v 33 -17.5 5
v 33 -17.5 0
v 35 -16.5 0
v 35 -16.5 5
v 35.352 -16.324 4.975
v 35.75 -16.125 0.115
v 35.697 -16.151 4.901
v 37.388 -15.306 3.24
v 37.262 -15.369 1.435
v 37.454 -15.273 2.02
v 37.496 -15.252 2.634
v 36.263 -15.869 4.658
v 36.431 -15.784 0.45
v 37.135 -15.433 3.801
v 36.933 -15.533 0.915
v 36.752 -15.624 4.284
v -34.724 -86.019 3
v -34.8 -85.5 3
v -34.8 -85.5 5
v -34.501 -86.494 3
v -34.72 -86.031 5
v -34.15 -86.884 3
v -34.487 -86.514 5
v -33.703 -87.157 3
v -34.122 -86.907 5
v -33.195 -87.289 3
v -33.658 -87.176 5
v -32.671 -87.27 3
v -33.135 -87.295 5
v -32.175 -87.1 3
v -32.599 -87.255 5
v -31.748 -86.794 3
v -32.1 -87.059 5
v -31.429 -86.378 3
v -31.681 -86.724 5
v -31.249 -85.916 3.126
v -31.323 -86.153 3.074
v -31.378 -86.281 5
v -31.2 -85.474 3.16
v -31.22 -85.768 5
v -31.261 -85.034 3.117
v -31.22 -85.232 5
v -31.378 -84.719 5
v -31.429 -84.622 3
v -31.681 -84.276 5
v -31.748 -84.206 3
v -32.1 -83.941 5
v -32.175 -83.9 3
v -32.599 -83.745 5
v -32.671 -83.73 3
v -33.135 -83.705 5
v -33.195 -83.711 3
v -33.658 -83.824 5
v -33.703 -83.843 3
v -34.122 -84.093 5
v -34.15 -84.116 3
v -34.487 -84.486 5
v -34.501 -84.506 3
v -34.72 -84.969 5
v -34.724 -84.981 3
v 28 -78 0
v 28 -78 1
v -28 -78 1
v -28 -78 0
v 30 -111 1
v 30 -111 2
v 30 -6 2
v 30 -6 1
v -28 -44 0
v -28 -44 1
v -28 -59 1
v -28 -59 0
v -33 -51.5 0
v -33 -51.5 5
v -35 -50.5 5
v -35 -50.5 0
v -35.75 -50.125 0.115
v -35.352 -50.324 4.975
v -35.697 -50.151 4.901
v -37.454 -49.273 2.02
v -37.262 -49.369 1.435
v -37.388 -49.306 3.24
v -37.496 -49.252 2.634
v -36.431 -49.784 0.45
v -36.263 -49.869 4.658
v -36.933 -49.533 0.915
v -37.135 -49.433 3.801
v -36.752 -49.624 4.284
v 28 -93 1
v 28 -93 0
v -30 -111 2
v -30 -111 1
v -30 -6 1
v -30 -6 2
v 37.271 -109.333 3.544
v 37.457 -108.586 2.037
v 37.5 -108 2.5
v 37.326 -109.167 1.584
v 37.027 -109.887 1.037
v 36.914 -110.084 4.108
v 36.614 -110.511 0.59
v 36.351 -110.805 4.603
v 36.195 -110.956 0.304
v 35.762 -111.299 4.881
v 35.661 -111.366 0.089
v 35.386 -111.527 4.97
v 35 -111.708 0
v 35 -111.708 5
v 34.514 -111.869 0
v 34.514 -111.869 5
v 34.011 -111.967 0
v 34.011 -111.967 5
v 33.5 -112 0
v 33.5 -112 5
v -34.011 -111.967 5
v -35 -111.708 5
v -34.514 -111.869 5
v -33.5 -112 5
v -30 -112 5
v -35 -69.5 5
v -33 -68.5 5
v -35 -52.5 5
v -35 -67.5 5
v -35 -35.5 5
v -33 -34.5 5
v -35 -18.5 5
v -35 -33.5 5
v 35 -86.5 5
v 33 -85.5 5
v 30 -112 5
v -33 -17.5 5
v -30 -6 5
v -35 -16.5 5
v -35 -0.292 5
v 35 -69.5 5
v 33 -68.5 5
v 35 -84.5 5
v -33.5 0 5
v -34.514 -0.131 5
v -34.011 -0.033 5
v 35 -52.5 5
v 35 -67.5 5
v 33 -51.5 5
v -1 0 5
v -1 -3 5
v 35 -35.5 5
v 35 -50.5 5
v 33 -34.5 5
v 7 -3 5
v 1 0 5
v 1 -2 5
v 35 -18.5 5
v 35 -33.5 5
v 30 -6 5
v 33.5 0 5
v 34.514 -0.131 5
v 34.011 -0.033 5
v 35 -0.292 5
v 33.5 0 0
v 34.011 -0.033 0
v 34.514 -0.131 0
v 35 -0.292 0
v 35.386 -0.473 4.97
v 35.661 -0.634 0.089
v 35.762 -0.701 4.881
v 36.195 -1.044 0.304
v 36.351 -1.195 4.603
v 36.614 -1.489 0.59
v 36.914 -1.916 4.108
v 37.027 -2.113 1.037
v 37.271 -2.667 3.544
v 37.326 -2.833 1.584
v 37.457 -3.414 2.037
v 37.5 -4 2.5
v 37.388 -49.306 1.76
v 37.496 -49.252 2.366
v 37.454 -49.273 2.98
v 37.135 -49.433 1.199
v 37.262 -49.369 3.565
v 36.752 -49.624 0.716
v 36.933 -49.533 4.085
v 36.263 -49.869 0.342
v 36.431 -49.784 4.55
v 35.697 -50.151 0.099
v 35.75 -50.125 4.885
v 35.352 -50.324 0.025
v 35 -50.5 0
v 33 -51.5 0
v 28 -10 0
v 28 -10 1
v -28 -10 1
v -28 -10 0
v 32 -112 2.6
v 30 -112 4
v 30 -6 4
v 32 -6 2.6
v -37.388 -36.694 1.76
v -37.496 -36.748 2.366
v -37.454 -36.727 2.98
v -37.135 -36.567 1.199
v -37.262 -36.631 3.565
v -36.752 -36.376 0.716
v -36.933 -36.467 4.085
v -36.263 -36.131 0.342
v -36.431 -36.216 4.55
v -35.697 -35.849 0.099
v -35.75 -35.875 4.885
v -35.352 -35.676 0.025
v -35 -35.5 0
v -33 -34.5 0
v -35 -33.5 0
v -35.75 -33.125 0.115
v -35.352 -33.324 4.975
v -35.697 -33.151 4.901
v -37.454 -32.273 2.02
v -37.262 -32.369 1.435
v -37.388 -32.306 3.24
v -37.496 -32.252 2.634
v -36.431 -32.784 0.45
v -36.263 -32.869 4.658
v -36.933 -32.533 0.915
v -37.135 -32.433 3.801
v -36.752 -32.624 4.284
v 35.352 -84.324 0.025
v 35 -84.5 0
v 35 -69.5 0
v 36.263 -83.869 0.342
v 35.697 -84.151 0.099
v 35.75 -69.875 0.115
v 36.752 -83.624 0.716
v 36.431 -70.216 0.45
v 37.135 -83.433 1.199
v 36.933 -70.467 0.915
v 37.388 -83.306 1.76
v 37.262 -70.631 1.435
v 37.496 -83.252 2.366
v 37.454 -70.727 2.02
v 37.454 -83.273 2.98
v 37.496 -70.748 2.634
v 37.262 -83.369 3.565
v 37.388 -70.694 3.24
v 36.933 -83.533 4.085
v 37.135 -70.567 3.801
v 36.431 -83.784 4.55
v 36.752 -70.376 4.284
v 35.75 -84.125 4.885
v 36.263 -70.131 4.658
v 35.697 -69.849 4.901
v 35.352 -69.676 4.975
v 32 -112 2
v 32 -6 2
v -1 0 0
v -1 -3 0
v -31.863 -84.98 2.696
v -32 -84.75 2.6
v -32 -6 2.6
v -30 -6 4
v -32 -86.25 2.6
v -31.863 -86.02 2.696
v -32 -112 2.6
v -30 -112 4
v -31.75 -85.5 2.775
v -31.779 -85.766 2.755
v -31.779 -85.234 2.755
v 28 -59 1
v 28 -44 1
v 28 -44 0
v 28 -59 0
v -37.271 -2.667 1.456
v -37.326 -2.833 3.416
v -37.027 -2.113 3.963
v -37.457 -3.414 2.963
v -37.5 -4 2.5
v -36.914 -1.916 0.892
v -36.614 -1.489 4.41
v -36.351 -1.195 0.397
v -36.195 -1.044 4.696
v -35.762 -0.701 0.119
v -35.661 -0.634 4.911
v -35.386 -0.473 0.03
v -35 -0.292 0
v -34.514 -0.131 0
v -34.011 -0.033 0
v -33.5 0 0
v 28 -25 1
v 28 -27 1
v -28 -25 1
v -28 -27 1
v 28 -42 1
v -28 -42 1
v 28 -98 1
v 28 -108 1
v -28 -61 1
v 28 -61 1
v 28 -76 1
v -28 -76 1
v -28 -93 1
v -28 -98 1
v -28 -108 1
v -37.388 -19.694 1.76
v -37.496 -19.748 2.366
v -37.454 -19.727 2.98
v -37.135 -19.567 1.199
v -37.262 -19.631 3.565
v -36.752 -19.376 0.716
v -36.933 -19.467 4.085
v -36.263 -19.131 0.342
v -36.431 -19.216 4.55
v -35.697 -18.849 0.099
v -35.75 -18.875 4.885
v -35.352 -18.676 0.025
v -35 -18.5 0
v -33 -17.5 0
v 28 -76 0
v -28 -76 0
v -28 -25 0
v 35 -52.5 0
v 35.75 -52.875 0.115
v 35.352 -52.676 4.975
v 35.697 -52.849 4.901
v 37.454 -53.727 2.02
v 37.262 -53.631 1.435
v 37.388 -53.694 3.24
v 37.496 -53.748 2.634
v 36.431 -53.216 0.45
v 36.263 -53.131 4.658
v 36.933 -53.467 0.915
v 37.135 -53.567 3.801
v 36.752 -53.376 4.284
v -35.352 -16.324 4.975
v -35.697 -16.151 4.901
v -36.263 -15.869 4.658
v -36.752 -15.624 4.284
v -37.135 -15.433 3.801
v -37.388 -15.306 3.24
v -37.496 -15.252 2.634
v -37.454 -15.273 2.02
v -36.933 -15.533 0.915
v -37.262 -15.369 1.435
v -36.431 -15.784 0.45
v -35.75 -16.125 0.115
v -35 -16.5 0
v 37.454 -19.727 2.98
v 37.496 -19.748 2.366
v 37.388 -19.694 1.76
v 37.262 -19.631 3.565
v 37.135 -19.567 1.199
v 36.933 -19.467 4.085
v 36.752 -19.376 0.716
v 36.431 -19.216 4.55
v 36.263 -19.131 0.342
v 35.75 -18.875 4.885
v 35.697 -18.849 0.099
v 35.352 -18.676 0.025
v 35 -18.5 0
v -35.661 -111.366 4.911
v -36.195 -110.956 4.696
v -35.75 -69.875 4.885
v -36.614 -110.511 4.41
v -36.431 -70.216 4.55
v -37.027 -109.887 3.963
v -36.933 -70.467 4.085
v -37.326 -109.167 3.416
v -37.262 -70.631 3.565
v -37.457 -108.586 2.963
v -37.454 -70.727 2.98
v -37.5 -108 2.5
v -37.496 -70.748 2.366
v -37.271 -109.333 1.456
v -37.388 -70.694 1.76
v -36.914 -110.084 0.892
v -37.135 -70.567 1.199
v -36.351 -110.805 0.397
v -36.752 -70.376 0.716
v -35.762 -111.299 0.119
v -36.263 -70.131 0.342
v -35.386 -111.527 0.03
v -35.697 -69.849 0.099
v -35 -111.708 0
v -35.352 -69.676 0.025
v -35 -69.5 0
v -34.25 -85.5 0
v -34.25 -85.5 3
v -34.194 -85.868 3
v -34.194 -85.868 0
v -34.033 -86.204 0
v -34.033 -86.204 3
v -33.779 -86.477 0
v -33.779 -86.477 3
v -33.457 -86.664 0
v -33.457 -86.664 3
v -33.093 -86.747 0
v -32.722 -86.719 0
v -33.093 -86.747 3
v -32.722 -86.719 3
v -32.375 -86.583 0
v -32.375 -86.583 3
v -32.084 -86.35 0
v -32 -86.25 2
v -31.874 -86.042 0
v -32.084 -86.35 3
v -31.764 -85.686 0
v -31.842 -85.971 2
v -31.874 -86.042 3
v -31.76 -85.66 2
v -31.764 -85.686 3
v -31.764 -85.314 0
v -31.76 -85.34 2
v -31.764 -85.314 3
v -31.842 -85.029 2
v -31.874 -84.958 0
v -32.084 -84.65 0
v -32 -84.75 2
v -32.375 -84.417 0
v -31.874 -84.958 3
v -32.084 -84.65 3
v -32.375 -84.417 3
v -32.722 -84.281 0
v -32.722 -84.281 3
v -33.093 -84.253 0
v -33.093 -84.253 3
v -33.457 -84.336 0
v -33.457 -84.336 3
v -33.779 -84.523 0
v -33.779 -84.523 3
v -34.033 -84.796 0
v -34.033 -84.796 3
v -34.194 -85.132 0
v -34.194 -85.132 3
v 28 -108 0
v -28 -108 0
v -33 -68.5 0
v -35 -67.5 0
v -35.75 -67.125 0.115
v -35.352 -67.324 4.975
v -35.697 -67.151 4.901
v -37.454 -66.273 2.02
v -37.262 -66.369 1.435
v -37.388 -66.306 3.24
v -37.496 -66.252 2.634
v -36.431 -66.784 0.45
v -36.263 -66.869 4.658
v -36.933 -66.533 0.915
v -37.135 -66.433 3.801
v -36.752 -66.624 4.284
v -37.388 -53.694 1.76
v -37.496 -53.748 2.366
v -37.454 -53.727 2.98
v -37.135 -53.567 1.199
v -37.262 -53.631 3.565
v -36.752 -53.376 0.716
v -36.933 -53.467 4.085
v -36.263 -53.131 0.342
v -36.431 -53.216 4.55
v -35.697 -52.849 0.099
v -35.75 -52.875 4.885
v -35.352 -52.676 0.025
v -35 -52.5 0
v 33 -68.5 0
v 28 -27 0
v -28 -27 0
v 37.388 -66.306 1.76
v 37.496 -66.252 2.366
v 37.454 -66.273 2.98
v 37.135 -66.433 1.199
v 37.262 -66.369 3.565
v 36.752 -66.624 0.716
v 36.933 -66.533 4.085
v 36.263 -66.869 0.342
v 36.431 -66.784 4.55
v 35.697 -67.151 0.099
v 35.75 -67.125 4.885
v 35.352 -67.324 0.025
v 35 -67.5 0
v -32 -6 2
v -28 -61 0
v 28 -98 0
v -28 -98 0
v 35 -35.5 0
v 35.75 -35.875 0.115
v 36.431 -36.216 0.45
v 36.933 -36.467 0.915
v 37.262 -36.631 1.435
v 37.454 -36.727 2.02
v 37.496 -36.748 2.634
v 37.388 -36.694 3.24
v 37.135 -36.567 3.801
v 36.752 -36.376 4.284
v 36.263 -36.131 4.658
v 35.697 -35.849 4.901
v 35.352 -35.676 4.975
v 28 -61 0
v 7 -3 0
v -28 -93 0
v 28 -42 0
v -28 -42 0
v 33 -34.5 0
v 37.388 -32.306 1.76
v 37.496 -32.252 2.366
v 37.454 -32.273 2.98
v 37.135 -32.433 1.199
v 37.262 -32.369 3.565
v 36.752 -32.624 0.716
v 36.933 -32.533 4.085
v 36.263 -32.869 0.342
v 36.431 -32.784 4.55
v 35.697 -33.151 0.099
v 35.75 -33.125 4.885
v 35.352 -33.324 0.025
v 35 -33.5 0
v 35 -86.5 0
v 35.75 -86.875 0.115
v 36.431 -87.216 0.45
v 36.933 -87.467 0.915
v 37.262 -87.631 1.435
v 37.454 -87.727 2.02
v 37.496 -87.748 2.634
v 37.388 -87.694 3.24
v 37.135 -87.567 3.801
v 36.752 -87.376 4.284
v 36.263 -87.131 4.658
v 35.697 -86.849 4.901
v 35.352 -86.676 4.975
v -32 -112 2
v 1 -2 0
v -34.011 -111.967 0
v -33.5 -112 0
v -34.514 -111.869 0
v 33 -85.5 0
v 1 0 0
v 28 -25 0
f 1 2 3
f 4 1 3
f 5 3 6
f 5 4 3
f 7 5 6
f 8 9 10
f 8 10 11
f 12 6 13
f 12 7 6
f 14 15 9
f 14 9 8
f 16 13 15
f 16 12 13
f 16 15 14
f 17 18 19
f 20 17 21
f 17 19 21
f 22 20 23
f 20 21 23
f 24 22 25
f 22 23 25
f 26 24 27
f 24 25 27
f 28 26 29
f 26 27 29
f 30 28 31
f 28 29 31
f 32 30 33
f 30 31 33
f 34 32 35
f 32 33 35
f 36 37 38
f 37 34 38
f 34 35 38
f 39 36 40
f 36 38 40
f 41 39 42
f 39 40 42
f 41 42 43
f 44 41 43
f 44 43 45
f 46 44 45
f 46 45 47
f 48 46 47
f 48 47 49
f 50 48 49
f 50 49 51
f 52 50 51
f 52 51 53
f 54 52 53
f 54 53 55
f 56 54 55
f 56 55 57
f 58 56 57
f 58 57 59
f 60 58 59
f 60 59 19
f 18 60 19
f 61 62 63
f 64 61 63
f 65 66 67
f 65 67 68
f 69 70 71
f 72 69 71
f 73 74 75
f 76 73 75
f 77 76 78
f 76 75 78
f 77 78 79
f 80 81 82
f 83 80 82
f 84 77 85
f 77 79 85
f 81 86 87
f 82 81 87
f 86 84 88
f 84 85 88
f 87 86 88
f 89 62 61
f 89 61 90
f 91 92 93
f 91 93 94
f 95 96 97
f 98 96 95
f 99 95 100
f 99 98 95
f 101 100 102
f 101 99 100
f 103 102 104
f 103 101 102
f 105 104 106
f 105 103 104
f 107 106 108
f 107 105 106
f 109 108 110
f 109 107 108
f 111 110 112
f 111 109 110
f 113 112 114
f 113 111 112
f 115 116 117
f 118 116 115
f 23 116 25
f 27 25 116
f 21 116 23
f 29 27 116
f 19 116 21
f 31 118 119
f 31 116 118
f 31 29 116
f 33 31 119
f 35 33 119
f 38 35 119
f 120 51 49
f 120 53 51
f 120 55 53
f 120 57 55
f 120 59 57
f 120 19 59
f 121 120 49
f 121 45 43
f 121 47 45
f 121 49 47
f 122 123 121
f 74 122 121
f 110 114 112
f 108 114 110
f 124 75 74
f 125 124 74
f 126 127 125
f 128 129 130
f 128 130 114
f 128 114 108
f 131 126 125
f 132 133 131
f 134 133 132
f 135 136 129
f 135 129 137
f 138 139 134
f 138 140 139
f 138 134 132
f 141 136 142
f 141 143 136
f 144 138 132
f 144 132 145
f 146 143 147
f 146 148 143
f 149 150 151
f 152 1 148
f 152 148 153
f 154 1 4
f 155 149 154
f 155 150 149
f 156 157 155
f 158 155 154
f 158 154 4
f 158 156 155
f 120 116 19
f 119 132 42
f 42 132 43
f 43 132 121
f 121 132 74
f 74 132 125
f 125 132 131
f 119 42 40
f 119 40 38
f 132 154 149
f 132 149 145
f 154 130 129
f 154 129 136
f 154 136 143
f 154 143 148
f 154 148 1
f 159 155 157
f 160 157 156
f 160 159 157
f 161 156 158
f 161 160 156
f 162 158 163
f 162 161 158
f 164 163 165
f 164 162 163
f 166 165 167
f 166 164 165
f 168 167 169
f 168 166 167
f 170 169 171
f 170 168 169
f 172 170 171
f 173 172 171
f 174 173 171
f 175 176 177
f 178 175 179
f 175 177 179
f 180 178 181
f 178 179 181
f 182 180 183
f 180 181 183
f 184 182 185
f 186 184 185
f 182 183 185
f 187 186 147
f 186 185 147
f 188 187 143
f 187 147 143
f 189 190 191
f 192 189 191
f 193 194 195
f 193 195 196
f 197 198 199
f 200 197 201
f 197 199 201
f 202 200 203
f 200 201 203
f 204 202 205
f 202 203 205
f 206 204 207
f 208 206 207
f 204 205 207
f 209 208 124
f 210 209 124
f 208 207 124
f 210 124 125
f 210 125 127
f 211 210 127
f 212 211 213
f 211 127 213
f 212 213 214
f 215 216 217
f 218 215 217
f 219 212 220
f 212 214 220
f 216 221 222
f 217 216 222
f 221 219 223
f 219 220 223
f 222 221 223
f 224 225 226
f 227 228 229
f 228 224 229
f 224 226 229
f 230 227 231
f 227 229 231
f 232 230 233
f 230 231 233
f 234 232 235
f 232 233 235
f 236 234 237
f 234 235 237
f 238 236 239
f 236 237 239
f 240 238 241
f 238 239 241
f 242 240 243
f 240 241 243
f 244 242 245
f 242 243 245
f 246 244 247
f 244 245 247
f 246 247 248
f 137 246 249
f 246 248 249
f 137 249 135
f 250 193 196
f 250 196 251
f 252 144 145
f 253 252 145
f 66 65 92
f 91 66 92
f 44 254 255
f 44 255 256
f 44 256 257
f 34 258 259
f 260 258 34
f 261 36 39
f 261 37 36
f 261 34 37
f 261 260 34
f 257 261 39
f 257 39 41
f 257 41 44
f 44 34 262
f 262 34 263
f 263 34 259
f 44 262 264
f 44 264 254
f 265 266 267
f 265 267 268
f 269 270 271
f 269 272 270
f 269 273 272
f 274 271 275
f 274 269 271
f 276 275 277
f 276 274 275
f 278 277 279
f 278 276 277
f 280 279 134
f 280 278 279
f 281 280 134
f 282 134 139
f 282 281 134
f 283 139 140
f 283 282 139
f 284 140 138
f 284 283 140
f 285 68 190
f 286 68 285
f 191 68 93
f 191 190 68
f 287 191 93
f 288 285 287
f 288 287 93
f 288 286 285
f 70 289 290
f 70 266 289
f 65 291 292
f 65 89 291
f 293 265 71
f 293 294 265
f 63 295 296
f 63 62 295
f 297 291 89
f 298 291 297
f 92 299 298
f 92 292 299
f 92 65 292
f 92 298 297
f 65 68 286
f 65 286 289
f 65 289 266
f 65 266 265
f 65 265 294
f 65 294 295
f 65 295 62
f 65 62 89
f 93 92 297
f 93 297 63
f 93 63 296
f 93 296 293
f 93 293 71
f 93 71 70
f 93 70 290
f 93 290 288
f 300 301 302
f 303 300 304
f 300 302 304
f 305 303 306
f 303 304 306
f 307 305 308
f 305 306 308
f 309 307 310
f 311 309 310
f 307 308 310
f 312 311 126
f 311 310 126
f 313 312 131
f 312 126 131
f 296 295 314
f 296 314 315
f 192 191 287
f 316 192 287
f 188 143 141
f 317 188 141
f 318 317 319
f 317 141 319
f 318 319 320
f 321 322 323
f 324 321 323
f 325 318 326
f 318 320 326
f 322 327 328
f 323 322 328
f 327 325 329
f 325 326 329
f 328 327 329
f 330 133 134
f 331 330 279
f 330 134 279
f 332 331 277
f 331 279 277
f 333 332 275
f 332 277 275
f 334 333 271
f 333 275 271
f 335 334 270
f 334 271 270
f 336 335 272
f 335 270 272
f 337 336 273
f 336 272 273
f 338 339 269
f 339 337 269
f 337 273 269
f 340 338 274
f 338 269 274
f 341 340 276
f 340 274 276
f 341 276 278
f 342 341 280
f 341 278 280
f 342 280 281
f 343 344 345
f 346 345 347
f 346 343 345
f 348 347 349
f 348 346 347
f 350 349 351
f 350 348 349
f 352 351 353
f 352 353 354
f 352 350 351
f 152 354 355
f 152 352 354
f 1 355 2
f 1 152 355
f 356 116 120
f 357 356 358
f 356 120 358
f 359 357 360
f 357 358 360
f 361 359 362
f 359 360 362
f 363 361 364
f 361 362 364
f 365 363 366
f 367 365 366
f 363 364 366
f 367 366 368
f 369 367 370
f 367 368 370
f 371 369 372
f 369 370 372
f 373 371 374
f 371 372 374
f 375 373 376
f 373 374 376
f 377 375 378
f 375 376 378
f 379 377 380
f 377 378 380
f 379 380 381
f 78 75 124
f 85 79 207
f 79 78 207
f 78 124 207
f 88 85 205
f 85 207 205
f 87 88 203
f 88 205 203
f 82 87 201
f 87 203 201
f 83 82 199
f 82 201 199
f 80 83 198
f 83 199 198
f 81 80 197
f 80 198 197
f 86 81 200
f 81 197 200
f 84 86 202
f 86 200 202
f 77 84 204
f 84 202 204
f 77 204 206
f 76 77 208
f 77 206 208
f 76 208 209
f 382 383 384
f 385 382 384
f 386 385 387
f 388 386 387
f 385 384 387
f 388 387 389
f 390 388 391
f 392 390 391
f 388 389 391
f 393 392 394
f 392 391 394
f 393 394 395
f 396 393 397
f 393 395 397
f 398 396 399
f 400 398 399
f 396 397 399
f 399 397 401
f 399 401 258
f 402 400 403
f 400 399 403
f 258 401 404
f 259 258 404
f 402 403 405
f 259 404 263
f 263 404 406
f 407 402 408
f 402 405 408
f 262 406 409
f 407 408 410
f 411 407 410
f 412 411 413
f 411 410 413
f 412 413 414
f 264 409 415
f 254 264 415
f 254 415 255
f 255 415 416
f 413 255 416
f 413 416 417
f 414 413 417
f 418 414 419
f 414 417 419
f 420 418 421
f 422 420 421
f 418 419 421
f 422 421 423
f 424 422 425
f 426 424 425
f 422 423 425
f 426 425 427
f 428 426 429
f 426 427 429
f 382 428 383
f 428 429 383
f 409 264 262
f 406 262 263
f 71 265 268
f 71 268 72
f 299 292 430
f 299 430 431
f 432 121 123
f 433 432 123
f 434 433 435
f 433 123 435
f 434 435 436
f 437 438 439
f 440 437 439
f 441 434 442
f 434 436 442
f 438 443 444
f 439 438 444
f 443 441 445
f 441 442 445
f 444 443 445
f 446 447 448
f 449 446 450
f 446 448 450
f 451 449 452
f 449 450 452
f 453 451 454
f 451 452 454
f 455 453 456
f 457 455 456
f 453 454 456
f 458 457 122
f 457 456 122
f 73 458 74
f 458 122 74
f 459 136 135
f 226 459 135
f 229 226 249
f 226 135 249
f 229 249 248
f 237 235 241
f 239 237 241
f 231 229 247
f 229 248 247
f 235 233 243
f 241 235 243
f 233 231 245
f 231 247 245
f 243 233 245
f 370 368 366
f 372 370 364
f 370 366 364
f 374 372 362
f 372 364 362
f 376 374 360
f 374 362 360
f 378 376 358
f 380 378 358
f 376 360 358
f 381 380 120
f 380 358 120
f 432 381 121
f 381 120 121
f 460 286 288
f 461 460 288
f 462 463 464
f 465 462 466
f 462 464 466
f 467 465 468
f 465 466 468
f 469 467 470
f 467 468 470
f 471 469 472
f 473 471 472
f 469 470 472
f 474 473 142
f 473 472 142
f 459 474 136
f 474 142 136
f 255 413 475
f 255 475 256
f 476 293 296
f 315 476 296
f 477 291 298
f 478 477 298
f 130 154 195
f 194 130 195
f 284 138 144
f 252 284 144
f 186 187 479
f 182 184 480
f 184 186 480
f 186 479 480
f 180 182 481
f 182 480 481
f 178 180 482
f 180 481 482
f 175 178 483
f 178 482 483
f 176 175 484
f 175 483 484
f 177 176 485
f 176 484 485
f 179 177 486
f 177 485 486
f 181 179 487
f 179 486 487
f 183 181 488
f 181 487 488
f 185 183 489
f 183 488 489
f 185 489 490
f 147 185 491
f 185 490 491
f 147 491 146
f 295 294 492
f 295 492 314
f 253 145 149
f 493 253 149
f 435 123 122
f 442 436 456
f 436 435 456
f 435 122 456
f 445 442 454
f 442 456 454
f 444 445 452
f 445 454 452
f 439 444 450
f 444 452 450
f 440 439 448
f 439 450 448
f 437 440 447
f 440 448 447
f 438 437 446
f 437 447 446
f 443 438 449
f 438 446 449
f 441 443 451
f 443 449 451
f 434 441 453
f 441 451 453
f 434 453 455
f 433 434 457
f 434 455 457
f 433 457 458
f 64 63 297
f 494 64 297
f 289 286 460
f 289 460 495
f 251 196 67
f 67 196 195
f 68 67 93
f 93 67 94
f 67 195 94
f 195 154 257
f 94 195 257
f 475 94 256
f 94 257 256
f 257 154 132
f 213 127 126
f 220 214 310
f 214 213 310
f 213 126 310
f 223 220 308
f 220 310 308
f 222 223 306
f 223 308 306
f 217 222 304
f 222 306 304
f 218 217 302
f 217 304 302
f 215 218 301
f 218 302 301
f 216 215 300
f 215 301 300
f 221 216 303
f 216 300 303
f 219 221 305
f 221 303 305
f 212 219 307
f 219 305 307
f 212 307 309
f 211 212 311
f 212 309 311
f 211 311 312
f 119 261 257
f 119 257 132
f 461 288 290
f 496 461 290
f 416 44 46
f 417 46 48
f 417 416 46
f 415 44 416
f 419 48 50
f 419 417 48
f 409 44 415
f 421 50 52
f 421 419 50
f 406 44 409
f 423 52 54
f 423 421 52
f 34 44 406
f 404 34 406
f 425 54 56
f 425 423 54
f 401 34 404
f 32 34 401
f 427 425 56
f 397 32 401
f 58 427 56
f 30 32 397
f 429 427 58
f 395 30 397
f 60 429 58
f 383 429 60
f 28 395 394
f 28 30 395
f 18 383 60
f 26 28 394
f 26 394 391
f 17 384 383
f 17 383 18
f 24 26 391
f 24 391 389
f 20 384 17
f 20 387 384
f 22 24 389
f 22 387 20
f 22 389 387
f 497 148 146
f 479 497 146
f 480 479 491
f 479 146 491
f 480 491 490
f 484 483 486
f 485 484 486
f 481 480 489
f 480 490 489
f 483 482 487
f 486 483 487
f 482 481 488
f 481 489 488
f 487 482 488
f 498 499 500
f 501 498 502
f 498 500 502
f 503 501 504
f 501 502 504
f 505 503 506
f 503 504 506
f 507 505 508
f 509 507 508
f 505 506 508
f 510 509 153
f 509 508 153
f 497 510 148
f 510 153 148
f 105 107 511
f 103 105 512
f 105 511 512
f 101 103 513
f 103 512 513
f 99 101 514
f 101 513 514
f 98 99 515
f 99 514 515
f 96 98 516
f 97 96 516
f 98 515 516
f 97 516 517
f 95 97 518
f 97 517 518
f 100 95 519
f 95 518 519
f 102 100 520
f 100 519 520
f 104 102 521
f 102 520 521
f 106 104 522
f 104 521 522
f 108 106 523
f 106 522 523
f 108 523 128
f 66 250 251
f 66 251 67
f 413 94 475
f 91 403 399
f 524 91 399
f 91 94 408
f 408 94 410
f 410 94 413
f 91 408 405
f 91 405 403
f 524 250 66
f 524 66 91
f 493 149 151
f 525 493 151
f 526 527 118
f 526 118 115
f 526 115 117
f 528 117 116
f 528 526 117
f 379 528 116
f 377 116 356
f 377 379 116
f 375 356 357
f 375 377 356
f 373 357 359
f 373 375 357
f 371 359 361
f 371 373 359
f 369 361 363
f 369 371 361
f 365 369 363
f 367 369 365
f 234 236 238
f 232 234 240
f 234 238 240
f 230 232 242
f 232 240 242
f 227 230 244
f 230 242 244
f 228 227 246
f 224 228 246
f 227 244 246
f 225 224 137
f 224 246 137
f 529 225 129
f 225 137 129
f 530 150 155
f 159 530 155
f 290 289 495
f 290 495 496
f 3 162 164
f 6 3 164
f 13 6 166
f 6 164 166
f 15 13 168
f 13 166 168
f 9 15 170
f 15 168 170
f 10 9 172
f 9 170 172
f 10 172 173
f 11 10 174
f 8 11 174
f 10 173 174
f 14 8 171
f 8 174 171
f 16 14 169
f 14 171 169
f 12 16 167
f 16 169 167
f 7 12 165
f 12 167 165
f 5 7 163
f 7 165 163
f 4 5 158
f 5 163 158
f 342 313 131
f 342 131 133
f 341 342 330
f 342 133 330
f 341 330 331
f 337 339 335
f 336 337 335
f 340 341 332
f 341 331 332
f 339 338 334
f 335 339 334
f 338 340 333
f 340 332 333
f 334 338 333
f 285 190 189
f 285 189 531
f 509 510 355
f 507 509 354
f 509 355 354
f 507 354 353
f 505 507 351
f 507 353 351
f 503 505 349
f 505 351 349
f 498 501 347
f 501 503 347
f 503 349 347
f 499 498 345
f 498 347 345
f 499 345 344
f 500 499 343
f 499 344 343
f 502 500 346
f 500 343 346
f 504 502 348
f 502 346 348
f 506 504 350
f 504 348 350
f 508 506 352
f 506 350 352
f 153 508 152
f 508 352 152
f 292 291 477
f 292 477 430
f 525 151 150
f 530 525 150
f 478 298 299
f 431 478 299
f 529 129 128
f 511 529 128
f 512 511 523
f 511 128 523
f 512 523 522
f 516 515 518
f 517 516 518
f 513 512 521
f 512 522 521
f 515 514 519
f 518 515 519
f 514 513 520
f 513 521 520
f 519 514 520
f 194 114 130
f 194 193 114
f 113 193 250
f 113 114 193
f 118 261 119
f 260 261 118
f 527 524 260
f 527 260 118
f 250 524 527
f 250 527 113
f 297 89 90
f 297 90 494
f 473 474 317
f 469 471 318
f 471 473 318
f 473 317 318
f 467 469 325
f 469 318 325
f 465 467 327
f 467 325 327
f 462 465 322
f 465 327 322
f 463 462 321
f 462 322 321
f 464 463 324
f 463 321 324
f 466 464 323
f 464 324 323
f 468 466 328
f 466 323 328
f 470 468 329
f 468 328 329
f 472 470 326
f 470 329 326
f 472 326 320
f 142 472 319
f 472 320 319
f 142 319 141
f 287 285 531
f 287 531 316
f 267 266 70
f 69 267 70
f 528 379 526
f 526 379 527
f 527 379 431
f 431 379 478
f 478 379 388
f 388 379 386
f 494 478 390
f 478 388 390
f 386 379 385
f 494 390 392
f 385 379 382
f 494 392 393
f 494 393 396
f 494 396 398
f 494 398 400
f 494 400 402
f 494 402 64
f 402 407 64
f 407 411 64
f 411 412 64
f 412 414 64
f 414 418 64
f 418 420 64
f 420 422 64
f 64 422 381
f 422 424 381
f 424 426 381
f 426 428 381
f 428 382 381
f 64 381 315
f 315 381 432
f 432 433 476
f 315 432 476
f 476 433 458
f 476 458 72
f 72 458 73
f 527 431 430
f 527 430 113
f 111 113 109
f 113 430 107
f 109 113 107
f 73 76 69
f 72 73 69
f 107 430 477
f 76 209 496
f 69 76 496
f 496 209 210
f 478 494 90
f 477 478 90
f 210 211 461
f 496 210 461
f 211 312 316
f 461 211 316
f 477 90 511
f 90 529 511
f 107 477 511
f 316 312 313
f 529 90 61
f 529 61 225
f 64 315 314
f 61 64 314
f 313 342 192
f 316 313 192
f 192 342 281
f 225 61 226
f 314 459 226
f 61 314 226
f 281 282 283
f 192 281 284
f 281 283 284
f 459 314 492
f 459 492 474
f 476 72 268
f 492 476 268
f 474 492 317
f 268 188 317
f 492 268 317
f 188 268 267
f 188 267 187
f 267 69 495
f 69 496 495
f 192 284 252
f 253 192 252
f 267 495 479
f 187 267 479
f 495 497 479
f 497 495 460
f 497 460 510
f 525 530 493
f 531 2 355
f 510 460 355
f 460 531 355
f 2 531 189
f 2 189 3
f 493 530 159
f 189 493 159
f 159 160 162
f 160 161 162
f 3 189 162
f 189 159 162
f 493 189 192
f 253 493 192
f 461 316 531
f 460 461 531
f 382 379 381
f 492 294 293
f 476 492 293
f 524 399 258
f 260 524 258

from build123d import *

# Parameters (mm, degrees)
PAD_DEPTH       = 112
SKETCH001_W     = 56
SKETCH001_H     = 10
SKETCH001_H_2   = 15
POCKET_DEPTH    = 5.001
POCKET001_DEPTH = 106
SKETCH003_R     = 1.25
POCKET002_DEPTH = 5.001
POCKET003_DEPTH = 5.001
SKETCH005_R     = 1.8
POCKET004_DEPTH = 2
SKETCH006_W     = 60
SKETCH006_H     = 1
PAD001_DEPTH    = 1


with BuildPart() as part:
    # Sketch → Pad (new body)
    with BuildSketch(Plane.XZ):
        with BuildLine():
            ThreePointArc((-35, 5), (-37.5, 2.5), (-35, 0))
            Line((-35, 0), (35, 0))
            ThreePointArc((35, 0), (37.5, 2.5), (35, 5))
            Line((-35, 5), (35, 5))
        make_face()
    extrude(amount=PAD_DEPTH)

    # Sketch001 (on DatumPlane) → Pocket (cut, through all)
    with BuildSketch(Plane(origin=(0, 0, 5), x_dir=(-1, 0, 0), z_dir=(0, 0, 1))):
        with Locations((0, 103)):
            Rectangle(SKETCH001_W, SKETCH001_H)
        with Locations((0, 85.5)):
            Rectangle(SKETCH001_W, SKETCH001_H_2)
        with Locations((0, 68.5)):
            Rectangle(SKETCH001_W, SKETCH001_H_2)
        with Locations((0, 51.5)):
            Rectangle(SKETCH001_W, SKETCH001_H_2)
        with Locations((0, 34.5)):
            Rectangle(SKETCH001_W, SKETCH001_H_2)
        with Locations((0, 17.5)):
            Rectangle(SKETCH001_W, SKETCH001_H_2)
    extrude(amount=-POCKET_DEPTH, mode=Mode.SUBTRACT)

    # Sketch002 (on DatumPlane) → Pocket001 (cut)
    with BuildSketch(Plane.XZ.offset(112)):
        Polygon((-30, 9), (30, 9), (30, 4), (32, 2.6), (32, 2), (30, 2), (30, 1), (-30, 1), (-30, 2), (-32, 2), (-32, 2.6), (-30, 4), align=None)
    extrude(amount=-POCKET001_DEPTH, mode=Mode.SUBTRACT)

    # Sketch003 (on DatumPlane) → Pocket002 (cut, through all)
    with BuildSketch(Plane(origin=(0, 0, 5), x_dir=(-1, 0, 0), z_dir=(0, 0, 1))):
        with Locations((33, 85.5)):
            Circle(SKETCH003_R)
        Polygon((-38, 20), (-33, 17.5), (-38, 15), align=None)
        Polygon((-38, 32), (-33, 34.5), (-38, 37), align=None)
        Polygon((38, 20), (33, 17.5), (38, 15), align=None)
        Polygon((-38, 54), (-38, 49), (-33, 51.5), align=None)
        Polygon((-38, 71), (-38, 66), (-33, 68.5), align=None)
        Polygon((-38, 88), (-38, 83), (-33, 85.5), align=None)
        Polygon((38, 32), (38, 37), (33, 34.5), align=None)
        Polygon((38, 49), (38, 54), (33, 51.5), align=None)
        Polygon((38, 66), (38, 71), (33, 68.5), align=None)
        Polygon((-1, 0), (1, 0), (1, 3), (-7, 3), (-1, 2), align=None)
    extrude(amount=-POCKET002_DEPTH, mode=Mode.SUBTRACT)

    # Sketch004 (on DatumPlane) → Pocket003 (cut, through all)
    with BuildSketch(Plane(origin=(0, 0, 0), x_dir=(1, 0, 0), z_dir=(0, 0, -1))):
        with BuildLine():
            ThreePointArc((-37.5, 4), (-36.328427, 1.171573), (-33.5, 0))
            Line((-37.5, 0), (-33.5, 0))
            Line((-37.5, 4), (-37.5, 0))
        make_face()
        with BuildLine():
            ThreePointArc((33.5, 0), (36.328427, 1.171573), (37.5, 4))
            Line((37.5, 0), (37.5, 4))
            Line((33.5, 0), (37.5, 0))
        make_face()
        with BuildLine():
            ThreePointArc((-33.5, 112), (-36.328427, 110.828427), (-37.5, 108))
            Line((-37.5, 112), (-37.5, 108))
            Line((-33.5, 112), (-37.5, 112))
        make_face()
        with BuildLine():
            ThreePointArc((37.5, 108), (36.328427, 110.828427), (33.5, 112))
            Line((33.5, 112), (37.5, 112))
            Line((37.5, 112), (37.5, 108))
        make_face()
    extrude(amount=-POCKET003_DEPTH, mode=Mode.SUBTRACT)

    # Sketch005 (on DatumPlane) → Pocket004 (cut)
    with BuildSketch(Plane(origin=(0, 0, 5), x_dir=(-1, 0, 0), z_dir=(0, 0, 1))):
        with Locations((33, 85.5)):
            Circle(SKETCH005_R)
    extrude(amount=-POCKET004_DEPTH, mode=Mode.SUBTRACT)

    # Sketch006 (on DatumPlane) → Pad001 (join)
    with BuildSketch(Plane(origin=(0, 0, 1), x_dir=(-1, 0, 0), z_dir=(0, 0, 1))):
        with Locations((0, 111.5)):
            Rectangle(SKETCH006_W, SKETCH006_H)
    extrude(amount=PAD001_DEPTH)


solid = part.part
